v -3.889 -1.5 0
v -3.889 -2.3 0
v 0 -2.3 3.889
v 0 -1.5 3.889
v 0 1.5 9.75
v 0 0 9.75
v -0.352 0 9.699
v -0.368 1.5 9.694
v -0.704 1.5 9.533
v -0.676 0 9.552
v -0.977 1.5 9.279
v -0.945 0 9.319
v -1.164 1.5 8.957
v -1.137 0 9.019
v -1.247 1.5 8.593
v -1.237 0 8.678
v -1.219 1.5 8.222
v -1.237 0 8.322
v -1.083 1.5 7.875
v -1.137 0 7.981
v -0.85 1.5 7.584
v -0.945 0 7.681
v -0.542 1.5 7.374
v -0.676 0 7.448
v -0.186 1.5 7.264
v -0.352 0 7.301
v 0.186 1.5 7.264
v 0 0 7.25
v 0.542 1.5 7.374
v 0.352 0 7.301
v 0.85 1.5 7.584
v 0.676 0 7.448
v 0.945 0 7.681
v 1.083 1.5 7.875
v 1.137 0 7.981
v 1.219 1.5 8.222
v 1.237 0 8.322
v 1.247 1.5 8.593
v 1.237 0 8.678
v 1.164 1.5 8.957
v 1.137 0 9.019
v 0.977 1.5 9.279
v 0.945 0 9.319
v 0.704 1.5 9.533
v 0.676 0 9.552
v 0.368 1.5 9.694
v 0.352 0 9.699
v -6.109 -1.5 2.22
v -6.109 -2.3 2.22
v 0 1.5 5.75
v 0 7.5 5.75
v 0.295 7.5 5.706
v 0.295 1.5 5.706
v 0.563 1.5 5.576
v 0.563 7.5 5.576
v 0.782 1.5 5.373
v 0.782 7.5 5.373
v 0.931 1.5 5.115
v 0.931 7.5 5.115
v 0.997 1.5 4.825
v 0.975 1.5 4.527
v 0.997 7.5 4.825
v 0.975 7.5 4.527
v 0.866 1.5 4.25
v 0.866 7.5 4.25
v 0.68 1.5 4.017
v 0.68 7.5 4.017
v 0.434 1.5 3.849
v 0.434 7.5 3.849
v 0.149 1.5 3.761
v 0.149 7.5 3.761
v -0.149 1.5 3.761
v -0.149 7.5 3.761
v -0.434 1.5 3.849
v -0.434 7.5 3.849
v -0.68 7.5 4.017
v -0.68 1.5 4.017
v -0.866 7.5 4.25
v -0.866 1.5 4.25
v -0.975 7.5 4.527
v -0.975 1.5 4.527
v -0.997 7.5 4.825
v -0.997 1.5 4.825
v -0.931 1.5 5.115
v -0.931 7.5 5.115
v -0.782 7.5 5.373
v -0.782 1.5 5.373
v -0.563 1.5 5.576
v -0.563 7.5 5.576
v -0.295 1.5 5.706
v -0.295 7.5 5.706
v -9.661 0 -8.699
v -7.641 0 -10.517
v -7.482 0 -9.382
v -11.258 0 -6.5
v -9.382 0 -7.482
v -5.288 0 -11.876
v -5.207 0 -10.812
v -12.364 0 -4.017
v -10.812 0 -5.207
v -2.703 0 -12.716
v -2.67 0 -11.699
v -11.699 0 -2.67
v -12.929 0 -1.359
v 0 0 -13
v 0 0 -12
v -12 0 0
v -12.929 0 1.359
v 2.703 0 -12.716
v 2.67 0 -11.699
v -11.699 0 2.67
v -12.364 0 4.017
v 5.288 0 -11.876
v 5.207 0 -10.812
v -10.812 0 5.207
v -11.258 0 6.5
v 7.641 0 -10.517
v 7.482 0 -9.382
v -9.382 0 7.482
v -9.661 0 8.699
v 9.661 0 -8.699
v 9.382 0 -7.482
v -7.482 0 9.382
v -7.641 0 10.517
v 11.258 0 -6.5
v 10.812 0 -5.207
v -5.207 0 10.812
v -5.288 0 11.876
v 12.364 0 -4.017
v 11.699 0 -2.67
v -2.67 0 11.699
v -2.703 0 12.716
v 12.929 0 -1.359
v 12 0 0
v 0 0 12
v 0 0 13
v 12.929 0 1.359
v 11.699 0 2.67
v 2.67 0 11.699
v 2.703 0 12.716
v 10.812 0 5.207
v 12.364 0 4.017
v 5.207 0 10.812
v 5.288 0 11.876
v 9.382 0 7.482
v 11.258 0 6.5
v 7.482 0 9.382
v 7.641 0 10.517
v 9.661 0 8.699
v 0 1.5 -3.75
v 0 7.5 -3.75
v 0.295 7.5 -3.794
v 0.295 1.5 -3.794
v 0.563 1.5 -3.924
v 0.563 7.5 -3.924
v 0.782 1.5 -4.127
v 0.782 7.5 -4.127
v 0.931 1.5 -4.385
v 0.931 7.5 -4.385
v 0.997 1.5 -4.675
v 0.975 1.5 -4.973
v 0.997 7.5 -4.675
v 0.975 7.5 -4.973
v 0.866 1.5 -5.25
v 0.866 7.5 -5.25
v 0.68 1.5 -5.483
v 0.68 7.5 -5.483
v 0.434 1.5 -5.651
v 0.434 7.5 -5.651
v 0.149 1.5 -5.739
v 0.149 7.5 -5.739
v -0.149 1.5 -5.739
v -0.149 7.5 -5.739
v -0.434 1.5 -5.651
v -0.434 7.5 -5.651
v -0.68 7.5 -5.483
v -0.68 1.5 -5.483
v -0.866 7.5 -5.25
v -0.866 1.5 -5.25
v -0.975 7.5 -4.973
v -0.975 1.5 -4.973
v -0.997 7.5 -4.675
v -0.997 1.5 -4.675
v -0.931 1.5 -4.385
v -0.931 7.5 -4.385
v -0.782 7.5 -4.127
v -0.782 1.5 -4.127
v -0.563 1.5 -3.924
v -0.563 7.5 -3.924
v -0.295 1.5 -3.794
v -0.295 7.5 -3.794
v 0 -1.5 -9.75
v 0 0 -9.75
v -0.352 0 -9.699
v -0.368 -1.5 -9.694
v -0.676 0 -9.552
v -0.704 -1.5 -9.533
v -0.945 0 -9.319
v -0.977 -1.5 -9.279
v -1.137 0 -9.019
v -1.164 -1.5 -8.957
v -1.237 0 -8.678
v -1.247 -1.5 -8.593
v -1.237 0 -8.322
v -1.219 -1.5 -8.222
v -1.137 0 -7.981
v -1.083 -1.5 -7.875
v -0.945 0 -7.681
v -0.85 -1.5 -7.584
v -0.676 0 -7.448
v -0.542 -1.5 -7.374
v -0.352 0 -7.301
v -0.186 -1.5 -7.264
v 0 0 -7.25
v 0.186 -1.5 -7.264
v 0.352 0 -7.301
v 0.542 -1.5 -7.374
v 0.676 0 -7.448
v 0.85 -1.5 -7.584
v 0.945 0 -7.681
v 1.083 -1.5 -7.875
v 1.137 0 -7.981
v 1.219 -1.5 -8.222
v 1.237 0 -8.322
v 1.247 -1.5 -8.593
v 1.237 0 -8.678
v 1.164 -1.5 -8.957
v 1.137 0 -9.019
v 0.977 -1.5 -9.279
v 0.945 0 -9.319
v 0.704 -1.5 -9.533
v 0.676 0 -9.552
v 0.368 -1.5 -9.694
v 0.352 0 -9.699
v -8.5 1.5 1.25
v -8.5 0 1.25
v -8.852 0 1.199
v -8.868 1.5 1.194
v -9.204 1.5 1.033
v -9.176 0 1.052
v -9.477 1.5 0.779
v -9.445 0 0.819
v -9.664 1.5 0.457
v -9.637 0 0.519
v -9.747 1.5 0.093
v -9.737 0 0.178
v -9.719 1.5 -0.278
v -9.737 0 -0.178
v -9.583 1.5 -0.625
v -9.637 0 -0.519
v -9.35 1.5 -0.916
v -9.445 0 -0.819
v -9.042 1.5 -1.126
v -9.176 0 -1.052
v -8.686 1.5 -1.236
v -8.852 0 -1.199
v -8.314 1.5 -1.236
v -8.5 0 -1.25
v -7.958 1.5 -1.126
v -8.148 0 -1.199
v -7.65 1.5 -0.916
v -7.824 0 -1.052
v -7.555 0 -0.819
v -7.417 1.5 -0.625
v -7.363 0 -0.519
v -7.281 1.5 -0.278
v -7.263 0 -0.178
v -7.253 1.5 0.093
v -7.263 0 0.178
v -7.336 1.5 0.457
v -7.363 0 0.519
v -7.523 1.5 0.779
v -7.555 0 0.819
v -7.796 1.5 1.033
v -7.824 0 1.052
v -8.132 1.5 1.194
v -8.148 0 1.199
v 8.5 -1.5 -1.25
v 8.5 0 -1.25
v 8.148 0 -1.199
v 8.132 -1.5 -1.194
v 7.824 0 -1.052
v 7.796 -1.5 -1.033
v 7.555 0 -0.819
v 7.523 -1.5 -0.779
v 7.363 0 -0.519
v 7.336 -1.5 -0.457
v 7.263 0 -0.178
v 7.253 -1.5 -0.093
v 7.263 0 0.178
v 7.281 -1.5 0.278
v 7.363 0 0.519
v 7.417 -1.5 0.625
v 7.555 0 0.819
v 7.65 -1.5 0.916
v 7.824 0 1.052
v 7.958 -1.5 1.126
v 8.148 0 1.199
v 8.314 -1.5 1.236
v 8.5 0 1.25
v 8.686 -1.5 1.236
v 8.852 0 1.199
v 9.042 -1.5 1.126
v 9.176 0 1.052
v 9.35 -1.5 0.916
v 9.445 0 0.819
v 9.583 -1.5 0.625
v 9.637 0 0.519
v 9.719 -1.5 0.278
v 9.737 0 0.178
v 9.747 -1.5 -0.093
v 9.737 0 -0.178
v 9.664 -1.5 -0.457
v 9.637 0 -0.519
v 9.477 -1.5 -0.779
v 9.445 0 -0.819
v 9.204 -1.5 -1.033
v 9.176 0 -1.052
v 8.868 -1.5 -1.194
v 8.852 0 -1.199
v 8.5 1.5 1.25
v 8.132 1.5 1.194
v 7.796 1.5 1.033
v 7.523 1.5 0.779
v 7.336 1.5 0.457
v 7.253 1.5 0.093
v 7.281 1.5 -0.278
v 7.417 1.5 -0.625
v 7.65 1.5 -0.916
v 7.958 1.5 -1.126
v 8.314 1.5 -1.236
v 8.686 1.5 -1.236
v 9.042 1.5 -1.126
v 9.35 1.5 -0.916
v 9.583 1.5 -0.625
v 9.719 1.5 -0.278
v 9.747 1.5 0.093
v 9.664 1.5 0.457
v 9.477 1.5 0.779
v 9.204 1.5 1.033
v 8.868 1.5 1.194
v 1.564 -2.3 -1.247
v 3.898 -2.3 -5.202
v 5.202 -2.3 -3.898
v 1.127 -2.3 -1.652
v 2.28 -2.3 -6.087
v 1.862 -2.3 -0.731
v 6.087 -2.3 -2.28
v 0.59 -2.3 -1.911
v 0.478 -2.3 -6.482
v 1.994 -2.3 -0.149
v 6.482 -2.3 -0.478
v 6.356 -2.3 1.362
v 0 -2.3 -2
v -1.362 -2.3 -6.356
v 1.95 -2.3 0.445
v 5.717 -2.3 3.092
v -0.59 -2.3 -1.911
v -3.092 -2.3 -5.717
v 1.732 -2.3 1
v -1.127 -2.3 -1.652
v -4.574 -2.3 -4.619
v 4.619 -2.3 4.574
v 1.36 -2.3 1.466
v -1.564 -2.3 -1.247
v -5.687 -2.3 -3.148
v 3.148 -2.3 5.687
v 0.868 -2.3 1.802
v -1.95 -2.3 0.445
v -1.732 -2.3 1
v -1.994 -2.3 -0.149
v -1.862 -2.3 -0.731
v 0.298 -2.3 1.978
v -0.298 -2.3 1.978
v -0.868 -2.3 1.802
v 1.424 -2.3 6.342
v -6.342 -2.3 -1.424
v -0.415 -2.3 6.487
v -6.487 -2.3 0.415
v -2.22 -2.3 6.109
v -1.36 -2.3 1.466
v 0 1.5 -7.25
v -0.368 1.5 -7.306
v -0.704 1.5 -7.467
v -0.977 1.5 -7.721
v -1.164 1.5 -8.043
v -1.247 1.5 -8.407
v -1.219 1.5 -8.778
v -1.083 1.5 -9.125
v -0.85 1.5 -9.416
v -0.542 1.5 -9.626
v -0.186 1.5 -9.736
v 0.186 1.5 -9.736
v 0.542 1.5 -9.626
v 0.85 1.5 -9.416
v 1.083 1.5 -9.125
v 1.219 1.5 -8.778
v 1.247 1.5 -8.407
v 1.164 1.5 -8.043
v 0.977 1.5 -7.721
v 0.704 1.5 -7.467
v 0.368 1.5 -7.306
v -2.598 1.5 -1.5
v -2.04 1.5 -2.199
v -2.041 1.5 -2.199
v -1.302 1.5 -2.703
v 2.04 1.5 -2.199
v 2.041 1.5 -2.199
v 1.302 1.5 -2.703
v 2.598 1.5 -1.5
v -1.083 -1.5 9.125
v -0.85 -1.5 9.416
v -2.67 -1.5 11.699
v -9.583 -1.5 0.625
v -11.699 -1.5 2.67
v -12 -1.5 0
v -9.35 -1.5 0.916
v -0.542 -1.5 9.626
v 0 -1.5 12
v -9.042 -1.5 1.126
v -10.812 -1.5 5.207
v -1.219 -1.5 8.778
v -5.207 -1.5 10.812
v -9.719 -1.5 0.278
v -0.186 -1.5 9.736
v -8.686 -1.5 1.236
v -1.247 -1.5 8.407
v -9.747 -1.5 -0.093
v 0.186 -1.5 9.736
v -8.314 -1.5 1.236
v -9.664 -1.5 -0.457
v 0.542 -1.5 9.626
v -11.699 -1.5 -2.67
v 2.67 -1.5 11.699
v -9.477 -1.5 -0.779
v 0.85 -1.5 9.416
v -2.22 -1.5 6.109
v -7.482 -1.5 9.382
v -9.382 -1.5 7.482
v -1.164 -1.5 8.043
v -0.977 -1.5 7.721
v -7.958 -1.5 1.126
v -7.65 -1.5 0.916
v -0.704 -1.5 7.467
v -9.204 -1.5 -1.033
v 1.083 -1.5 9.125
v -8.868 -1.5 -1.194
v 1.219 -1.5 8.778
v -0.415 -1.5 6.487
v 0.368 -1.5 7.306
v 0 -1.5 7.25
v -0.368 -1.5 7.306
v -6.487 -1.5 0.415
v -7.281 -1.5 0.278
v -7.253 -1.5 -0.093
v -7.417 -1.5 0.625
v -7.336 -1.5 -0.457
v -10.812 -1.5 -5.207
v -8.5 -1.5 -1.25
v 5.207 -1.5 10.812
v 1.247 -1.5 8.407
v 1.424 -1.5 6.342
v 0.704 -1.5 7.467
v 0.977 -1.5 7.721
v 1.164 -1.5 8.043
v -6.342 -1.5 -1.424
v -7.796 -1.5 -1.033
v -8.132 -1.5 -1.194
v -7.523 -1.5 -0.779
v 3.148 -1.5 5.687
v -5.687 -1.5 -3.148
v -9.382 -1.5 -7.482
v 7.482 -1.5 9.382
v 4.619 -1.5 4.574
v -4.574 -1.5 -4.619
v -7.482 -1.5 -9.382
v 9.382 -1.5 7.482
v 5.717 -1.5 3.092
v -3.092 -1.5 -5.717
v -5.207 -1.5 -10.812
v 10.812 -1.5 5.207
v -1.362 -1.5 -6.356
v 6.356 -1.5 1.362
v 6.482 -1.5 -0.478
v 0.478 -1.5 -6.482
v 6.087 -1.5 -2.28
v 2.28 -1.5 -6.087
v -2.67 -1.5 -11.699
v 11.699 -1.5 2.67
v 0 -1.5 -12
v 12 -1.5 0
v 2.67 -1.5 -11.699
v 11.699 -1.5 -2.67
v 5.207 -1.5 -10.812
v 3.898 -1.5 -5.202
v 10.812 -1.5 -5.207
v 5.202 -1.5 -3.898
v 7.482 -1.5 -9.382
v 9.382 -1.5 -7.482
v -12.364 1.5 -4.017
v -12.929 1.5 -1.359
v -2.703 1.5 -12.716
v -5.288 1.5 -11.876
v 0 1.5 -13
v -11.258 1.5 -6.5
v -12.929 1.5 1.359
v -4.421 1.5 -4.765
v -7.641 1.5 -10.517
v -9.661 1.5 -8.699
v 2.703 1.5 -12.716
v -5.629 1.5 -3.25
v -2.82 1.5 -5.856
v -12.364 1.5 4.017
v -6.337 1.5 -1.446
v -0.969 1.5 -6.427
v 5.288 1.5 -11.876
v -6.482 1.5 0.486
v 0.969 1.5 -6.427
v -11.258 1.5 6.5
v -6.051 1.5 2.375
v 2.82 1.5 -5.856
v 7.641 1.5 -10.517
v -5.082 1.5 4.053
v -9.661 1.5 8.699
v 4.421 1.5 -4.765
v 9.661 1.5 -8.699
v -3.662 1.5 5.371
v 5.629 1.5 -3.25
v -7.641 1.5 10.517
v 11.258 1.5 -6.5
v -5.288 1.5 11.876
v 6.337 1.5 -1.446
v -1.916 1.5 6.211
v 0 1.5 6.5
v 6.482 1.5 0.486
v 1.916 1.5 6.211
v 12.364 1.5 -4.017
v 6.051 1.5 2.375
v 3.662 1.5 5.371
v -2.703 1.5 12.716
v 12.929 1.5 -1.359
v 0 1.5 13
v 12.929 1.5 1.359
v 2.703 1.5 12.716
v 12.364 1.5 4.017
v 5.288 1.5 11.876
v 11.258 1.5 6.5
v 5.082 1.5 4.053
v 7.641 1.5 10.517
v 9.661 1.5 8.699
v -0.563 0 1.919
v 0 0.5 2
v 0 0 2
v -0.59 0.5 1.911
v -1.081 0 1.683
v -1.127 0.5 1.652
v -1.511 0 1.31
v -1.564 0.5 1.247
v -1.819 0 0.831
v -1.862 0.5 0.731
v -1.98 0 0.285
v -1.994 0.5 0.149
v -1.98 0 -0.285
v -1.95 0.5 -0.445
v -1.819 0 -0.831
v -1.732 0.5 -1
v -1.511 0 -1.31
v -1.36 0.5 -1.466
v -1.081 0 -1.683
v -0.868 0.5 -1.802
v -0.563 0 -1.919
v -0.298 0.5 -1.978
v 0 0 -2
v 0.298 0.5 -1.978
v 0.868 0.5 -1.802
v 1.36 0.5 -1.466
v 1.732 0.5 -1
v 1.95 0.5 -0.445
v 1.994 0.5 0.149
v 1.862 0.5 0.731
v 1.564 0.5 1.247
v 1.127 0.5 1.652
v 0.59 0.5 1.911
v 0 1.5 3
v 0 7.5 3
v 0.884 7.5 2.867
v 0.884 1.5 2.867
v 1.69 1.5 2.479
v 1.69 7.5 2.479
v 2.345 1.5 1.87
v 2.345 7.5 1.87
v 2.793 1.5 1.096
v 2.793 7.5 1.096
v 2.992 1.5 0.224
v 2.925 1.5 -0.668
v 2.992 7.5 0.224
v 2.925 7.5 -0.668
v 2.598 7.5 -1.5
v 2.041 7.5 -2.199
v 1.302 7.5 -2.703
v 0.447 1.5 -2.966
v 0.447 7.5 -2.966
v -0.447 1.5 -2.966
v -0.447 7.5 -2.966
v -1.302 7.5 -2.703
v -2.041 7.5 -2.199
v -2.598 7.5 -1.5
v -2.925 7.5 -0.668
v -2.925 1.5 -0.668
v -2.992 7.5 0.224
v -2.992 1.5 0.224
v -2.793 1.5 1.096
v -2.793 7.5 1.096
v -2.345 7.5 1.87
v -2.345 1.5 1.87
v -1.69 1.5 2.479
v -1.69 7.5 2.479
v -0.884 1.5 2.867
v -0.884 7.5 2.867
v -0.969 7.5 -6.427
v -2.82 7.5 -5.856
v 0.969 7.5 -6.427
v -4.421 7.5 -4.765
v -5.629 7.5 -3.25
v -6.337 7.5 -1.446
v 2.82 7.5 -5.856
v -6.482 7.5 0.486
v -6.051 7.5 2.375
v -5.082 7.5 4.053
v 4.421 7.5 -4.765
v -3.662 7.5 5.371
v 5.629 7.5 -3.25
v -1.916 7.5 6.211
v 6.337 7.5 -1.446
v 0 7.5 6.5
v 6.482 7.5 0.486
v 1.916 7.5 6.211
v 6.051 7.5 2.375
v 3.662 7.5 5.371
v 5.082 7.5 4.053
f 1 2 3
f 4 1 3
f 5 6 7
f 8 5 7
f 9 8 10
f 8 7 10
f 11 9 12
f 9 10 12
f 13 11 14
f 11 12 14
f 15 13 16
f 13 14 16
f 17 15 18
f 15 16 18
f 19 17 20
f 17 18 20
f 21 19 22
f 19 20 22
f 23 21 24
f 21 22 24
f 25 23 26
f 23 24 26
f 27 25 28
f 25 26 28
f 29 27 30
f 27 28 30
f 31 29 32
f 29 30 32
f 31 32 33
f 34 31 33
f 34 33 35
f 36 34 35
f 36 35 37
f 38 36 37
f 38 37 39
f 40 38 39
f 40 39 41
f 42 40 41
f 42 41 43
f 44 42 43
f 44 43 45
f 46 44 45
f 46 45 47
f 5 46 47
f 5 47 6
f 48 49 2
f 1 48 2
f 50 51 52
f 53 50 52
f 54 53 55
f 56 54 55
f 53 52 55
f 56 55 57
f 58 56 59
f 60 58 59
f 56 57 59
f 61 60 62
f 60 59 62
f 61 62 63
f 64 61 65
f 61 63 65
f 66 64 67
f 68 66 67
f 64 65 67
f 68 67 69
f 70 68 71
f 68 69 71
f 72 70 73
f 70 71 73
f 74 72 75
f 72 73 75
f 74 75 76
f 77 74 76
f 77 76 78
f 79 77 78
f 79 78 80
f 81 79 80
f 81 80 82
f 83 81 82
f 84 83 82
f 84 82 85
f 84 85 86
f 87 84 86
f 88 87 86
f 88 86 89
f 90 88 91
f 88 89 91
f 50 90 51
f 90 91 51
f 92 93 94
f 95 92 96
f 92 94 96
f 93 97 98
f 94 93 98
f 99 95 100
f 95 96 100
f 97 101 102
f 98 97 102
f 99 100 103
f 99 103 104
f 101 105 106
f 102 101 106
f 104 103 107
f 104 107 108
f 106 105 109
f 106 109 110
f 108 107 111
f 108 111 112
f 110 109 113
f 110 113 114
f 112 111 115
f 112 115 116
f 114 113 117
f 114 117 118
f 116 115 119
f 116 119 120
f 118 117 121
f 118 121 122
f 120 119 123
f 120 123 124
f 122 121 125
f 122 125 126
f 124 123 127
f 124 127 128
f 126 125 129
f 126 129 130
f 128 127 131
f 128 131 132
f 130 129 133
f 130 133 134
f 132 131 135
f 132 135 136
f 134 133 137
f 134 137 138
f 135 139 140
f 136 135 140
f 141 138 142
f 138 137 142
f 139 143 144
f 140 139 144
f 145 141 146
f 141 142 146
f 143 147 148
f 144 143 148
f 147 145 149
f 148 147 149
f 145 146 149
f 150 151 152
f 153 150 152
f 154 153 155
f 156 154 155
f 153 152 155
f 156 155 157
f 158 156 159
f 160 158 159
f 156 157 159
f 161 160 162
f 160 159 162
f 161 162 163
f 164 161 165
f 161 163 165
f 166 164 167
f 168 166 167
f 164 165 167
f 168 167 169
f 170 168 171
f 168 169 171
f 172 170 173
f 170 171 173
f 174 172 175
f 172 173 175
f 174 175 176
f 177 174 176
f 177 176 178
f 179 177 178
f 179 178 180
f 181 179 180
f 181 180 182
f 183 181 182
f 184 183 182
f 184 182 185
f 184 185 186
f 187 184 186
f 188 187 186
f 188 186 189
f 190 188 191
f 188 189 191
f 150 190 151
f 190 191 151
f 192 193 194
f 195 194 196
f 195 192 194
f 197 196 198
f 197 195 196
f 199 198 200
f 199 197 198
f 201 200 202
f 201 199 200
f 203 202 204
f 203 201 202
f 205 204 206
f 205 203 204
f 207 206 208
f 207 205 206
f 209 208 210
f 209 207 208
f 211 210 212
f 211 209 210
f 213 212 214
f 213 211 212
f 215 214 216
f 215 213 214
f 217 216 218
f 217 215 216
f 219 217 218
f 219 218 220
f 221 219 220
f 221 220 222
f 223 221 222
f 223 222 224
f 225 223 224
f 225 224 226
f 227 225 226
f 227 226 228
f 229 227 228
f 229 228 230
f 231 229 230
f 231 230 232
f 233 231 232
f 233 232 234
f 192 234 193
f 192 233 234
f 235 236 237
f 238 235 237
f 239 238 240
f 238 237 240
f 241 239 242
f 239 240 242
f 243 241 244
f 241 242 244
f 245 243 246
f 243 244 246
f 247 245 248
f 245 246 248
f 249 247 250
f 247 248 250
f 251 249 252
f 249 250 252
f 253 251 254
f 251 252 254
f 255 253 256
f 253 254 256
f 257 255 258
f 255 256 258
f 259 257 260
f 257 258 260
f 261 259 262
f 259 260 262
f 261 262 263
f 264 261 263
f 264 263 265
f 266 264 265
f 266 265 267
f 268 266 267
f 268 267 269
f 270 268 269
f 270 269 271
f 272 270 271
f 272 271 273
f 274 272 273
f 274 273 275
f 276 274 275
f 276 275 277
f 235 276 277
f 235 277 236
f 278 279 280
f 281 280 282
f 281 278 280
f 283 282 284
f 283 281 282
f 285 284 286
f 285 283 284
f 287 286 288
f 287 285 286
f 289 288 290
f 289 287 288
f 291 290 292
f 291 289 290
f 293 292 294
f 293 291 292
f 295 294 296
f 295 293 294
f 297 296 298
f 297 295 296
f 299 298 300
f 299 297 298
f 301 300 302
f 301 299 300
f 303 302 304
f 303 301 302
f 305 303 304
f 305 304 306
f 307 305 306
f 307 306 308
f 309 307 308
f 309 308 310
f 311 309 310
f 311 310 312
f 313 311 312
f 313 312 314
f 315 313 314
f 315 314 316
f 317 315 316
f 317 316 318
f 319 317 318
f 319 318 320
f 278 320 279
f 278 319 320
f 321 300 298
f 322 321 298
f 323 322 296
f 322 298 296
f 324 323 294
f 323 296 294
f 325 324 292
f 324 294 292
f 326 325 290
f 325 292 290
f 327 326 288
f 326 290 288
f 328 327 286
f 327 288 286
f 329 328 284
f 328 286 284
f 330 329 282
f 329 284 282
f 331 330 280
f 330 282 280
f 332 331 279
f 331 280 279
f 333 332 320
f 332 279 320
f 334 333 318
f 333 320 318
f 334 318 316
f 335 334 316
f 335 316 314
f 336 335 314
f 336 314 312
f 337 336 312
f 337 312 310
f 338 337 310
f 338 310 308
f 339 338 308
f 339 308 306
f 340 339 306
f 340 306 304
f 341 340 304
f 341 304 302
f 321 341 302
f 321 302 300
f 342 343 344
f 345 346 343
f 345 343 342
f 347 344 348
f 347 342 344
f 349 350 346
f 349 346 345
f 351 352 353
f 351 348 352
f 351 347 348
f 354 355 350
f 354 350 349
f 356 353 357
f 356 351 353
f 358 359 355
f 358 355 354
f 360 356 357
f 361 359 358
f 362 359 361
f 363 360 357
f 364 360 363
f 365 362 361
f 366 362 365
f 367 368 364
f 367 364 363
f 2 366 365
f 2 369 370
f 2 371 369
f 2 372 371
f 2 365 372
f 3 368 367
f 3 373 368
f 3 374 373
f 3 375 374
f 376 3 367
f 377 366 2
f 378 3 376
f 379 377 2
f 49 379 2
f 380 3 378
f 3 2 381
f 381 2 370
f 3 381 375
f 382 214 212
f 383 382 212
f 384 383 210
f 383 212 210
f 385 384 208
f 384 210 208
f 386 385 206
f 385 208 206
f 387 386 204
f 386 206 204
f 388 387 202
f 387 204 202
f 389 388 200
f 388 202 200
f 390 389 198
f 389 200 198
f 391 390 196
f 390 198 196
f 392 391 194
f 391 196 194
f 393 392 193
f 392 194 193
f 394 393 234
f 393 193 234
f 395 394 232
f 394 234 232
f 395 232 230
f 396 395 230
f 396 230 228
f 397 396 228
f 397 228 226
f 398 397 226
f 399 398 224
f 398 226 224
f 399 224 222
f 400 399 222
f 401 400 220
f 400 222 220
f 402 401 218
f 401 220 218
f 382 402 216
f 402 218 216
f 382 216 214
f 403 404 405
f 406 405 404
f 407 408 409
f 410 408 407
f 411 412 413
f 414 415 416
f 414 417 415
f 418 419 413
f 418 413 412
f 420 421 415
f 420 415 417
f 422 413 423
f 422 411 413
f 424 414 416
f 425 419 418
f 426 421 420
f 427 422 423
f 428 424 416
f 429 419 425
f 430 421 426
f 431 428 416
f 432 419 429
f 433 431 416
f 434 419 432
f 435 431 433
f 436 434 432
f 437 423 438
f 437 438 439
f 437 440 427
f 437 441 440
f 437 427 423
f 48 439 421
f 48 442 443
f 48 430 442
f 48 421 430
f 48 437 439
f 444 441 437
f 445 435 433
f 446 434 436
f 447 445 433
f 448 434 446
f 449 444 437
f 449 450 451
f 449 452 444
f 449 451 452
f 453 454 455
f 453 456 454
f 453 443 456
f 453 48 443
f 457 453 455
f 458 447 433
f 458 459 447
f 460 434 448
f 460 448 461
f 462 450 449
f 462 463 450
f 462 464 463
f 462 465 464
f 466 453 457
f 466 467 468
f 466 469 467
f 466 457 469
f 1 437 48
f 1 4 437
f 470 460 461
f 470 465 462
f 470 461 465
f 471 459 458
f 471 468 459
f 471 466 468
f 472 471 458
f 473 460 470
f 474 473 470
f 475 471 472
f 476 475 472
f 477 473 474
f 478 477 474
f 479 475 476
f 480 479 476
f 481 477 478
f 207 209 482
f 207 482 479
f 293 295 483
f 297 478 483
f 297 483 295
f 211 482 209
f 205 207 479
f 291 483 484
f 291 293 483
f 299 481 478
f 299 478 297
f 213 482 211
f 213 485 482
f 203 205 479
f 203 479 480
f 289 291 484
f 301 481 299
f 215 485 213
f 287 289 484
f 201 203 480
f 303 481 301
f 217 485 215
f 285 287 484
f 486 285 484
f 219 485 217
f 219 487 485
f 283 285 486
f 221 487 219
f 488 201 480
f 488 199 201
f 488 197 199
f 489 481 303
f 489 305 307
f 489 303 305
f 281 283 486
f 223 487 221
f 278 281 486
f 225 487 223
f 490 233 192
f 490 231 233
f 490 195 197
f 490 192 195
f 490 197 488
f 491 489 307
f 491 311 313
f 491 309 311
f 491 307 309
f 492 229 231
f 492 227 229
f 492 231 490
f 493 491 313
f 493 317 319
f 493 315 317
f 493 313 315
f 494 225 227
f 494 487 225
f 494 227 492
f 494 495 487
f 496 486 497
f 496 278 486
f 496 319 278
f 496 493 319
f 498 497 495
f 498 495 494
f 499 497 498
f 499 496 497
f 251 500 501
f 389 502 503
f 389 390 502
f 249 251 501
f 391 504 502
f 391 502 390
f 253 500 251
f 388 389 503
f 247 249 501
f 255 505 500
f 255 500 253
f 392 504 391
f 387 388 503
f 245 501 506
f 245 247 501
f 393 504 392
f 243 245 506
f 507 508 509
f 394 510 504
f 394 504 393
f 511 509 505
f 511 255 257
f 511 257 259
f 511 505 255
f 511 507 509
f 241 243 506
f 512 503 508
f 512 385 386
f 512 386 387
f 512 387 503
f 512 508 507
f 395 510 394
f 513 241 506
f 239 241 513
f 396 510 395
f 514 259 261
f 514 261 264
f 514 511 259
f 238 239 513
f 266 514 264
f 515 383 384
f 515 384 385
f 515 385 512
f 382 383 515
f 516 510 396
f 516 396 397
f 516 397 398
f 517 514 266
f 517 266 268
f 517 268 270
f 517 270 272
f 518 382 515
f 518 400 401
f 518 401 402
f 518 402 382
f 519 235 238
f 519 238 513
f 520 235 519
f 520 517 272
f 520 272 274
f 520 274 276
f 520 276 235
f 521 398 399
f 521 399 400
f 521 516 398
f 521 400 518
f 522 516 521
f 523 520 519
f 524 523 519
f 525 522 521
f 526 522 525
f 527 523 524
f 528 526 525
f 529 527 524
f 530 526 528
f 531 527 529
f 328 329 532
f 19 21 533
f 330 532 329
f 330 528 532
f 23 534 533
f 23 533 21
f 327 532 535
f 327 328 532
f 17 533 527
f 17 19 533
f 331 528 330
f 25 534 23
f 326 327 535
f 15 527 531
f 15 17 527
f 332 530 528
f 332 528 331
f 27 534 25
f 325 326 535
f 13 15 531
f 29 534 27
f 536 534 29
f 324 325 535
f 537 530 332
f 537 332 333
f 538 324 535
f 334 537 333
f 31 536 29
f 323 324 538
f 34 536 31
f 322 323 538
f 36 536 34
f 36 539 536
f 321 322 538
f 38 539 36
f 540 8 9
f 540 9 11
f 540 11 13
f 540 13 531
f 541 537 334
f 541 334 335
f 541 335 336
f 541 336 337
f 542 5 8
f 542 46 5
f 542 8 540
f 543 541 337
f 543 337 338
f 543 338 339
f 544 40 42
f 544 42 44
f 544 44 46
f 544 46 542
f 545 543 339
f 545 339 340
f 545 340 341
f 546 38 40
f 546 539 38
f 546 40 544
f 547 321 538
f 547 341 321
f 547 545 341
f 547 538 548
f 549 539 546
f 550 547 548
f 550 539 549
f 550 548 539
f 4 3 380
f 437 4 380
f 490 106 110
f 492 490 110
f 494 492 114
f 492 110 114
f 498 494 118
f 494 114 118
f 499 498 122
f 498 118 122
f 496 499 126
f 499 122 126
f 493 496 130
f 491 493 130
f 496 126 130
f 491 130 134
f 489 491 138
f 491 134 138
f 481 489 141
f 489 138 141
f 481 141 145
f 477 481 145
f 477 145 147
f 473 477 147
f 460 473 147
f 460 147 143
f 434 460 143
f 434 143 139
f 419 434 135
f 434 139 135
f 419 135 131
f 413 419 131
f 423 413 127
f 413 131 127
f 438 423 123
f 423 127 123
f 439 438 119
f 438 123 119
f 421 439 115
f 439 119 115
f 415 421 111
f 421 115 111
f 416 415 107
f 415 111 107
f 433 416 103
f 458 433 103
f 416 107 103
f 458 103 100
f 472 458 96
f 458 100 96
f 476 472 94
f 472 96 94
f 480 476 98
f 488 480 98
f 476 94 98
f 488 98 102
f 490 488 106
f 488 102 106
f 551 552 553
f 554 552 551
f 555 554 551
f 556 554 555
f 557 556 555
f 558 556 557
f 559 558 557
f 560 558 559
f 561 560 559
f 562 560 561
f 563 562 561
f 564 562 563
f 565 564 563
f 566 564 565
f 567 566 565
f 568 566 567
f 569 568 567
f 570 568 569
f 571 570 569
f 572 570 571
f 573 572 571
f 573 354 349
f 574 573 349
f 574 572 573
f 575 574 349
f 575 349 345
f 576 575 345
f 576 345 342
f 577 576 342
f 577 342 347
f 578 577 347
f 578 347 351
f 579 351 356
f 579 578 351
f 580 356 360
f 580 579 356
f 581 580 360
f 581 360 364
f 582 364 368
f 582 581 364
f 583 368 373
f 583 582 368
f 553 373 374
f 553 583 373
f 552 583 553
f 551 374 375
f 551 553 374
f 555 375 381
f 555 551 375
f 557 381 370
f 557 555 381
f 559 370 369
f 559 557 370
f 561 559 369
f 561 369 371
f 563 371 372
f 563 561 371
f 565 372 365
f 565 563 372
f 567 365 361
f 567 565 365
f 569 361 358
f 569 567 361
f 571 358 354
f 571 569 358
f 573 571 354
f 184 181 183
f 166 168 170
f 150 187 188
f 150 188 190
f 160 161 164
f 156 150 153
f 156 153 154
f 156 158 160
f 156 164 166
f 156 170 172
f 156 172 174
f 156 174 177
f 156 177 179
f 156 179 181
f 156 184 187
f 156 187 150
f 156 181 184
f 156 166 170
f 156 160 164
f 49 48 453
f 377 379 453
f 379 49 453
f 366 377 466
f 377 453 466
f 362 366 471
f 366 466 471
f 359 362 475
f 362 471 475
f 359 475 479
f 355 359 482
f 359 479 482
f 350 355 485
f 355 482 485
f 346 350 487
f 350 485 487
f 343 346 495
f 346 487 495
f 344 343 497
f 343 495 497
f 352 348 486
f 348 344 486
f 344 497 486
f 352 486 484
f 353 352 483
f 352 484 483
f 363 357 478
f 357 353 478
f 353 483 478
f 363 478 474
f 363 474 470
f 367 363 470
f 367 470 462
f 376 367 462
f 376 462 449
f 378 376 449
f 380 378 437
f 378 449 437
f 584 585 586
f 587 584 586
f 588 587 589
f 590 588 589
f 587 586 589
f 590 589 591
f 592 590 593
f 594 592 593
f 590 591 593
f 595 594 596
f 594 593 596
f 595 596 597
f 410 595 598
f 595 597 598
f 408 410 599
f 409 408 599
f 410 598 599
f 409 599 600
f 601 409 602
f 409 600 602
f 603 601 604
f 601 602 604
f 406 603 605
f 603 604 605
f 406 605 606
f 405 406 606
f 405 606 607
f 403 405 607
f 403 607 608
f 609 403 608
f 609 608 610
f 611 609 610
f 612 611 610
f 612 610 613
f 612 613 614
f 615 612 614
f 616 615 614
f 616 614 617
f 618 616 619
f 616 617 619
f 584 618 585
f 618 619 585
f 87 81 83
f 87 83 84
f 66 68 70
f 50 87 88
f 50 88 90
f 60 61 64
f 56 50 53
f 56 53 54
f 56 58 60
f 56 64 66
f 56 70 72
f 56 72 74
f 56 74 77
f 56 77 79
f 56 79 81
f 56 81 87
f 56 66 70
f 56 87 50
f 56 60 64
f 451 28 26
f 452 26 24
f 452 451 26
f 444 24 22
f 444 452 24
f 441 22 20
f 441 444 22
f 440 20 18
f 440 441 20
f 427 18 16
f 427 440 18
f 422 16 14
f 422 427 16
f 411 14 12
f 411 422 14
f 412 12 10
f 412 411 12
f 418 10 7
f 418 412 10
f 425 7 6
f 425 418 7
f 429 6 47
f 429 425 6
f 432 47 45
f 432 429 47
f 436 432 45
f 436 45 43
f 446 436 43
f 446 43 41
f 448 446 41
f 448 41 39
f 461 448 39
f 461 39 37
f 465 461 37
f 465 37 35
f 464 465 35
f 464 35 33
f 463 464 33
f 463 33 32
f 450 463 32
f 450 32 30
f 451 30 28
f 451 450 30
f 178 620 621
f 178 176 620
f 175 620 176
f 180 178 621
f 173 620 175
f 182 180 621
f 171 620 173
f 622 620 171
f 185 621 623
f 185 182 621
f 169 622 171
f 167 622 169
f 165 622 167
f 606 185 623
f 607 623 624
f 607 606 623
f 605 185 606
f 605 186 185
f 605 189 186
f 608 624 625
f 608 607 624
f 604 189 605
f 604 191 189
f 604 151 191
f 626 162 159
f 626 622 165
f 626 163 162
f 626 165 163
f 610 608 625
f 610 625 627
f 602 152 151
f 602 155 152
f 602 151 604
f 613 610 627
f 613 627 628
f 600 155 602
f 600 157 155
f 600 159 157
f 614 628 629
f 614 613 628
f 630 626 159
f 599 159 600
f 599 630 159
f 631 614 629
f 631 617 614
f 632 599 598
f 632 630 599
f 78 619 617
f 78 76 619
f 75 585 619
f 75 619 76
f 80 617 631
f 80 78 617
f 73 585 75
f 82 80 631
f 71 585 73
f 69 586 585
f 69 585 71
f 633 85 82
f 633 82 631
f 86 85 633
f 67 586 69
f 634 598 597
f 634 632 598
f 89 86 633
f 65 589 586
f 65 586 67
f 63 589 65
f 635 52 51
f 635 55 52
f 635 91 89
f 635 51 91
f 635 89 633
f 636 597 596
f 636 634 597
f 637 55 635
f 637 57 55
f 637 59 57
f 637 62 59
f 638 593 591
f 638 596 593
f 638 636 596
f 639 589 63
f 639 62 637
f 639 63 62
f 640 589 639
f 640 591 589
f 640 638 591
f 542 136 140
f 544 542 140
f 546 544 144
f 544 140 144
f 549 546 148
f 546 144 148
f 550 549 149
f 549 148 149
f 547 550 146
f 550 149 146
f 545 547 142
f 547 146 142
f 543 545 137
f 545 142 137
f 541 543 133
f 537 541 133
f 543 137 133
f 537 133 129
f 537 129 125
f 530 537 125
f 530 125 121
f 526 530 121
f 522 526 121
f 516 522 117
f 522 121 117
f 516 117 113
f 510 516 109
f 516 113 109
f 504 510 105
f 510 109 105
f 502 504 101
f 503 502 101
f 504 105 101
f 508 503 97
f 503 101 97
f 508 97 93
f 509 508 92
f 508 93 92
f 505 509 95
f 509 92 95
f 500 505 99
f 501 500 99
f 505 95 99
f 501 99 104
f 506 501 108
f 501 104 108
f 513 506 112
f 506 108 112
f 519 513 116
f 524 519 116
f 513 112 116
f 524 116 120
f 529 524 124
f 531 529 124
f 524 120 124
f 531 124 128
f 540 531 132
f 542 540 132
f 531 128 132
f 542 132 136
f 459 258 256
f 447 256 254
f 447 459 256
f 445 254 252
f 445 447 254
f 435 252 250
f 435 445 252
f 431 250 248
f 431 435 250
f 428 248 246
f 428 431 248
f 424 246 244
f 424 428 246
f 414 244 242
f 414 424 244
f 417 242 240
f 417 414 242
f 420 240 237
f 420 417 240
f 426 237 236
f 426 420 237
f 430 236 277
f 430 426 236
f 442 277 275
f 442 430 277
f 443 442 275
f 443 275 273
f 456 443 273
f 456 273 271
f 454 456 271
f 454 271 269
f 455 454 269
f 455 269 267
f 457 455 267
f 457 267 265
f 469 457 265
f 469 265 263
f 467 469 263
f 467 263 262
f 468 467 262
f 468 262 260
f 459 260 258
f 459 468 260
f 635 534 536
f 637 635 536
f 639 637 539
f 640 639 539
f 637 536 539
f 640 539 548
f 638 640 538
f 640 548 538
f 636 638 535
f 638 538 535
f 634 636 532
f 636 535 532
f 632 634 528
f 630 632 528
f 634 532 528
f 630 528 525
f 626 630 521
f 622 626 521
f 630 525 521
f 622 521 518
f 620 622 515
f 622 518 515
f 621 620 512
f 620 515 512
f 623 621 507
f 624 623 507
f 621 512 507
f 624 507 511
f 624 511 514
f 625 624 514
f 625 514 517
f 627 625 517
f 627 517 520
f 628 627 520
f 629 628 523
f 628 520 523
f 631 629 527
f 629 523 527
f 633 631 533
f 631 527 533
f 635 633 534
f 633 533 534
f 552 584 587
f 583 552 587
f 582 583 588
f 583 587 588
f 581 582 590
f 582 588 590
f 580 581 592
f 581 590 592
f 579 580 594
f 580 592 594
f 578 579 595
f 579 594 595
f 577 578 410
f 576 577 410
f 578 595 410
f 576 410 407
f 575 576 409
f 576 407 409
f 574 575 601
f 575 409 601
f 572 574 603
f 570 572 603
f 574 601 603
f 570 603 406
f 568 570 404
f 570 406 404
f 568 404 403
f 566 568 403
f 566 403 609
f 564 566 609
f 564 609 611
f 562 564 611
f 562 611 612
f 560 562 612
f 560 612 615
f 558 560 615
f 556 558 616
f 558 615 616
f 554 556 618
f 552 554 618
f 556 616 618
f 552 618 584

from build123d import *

# Parameters (mm, degrees)
SKETCH1_R           = 13
BOSS_EXTRUDE1_DEPTH = 1.5
SKETCH2_R           = 6.5
BOSS_EXTRUDE2_DEPTH = 6
SKETCH3_R           = 3
CUT_EXTRUDE1_DEPTH  = 6
SKETCH4_R           = 1.25
CUT_EXTRUDE5_DEPTH  = 8
SKETCH6_R           = 1
CUT_EXTRUDE6_DEPTH  = 6
SKETCH7_R           = 12
SKETCH7_R_2         = 2
BOSS_EXTRUDE3_DEPTH = 1.5
SKETCH8_R           = 6.5
SKETCH8_R_2         = 2
BOSS_EXTRUDE4_DEPTH = 0.8
CUT_EXTRUDE8_START  = -10.8
SKETCH9_R           = 1.25
CUT_EXTRUDE8_DEPTH  = 10.8
CUT_EXTRUDE9_START  = -10.8
SKETCH10_R          = 2
CUT_EXTRUDE9_DEPTH  = 10.8
CUT_EXTRUDE10_DEPTH = 0.8
CHAMFER4_SIZE       = 1


with BuildPart() as part:
    # Sketch1 → Boss-Extrude1 (new body)
    with BuildSketch(Plane(origin=(0, 0, 0), x_dir=(1, 0, 0), z_dir=(0, 1, 0))):
        with Locations(Location((0, 0, 0), (0, 0, 270))):
            Circle(SKETCH1_R)
    extrude(amount=BOSS_EXTRUDE1_DEPTH)

    # Sketch2 → Boss-Extrude2 (add)
    with BuildSketch(Plane(origin=(0, 1.5, 0), x_dir=(1, 0, 0), z_dir=(0, 1, 0))):
        with Locations(Location((0, 0, 0), (0, 0, 270))):
            Circle(SKETCH2_R)
    extrude(amount=BOSS_EXTRUDE2_DEPTH)

    # Sketch3 → Cut-Extrude1 (cut)
    with BuildSketch(Plane(origin=(0, 7.5, 0), x_dir=(1, 0, 0), z_dir=(0, 1, 0))):
        with Locations(Location((0, 0, 0), (0, 0, 270))):
            Circle(SKETCH3_R)
    extrude(amount=-CUT_EXTRUDE1_DEPTH, mode=Mode.SUBTRACT)

    # Sketch4 → Cut-Extrude5 (cut, symmetric)
    with BuildSketch(Plane.XZ):
        with Locations(Location((-8.5, 0, 0), (0, 0, 90))):
            Circle(SKETCH4_R)
        with Locations(Location((0, 8.5, 0), (0, 0, 90))):
            Circle(SKETCH4_R)
        with Locations(Location((8.5, 0, 0), (0, 0, 90))):
            Circle(SKETCH4_R)
        with Locations(Location((0, -8.5, 0), (0, 0, 90))):
            Circle(SKETCH4_R)
    extrude(amount=CUT_EXTRUDE5_DEPTH, both=True, mode=Mode.SUBTRACT)

    # Sketch6 → Cut-Extrude6 (cut)
    with BuildSketch(Plane(origin=(0, 7.5, 0), x_dir=(1, 0, 0), z_dir=(0, 1, 0))):
        with Locations(Location((0, 4.75, 0), (0, 0, 270))):
            Circle(SKETCH6_R)
        with Locations(Location((0, -4.75, 0), (0, 0, 270))):
            Circle(SKETCH6_R)
    extrude(amount=-CUT_EXTRUDE6_DEPTH, mode=Mode.SUBTRACT)

    # Sketch7 → Boss-Extrude3 (add)
    with BuildSketch(Plane.XZ):
        with Locations(Location((0, 0, 0), (0, 0, 270))):
            Circle(SKETCH7_R)
        with Locations(Location((0, 0, 0), (0, 0, 270))):
            Circle(SKETCH7_R_2, mode=Mode.SUBTRACT)
    extrude(amount=BOSS_EXTRUDE3_DEPTH)

    # Sketch8 → Boss-Extrude4 (add)
    with BuildSketch(Plane.XZ.offset(1.5)):
        with Locations(Location((0, 0, 0), (0, 0, 90))):
            Circle(SKETCH8_R)
        with Locations(Location((0, 0, 0), (0, 0, 270))):
            Circle(SKETCH8_R_2, mode=Mode.SUBTRACT)
    extrude(amount=BOSS_EXTRUDE4_DEPTH)

    # Sketch9 → Cut-Extrude8 (cut)
    with BuildSketch(Plane(origin=(0, 0, 0), x_dir=(1, 0, 0), z_dir=(0, 1, 0)).offset(CUT_EXTRUDE8_START)):
        with Locations(Location((8.5, 0, 0), (0, 0, 90))):
            Circle(SKETCH9_R)
        with Locations(Location((0, -8.5, 0), (0, 0, 90))):
            Circle(SKETCH9_R)
        with Locations(Location((-8.5, 0, 0), (0, 0, 90))):
            Circle(SKETCH9_R)
        with Locations(Location((0, 8.5, 0), (0, 0, 90))):
            Circle(SKETCH9_R)
    extrude(amount=CUT_EXTRUDE8_DEPTH, mode=Mode.SUBTRACT)

    # Sketch10 → Cut-Extrude9 (cut)
    with BuildSketch(Plane.XZ.offset(CUT_EXTRUDE9_START)):
        with Locations(Location((0, 0, 0), (0, 0, 90))):
            Circle(SKETCH10_R)
    extrude(amount=CUT_EXTRUDE9_DEPTH, mode=Mode.SUBTRACT)

    # Sketch11 → Cut-Extrude10 (cut)
    with BuildSketch(Plane.XZ.offset(2.3)):
        with BuildLine():
            Line((-6.109126461, 2.220039164), (-3.889087297, 0))
            Line((-3.889087297, 0), (0, 3.889087297))
            Line((0, 3.889087297), (-2.220039164, 6.109126461))
            ThreePointArc((-2.220039164, 6.109126461), (-4.596194078, 4.596194078), (-6.109126461, 2.220039164))
        make_face()
    extrude(amount=-CUT_EXTRUDE10_DEPTH, mode=Mode.SUBTRACT)

    # Chamfer4
    chamfer4_edges = [part.edges().sort_by_distance(p)[0] for p in [
        (0, 1.5, -2),
    ]]
    chamfer(chamfer4_edges, length=CHAMFER4_SIZE - 0.0001)  # a hair under: the kernel refuses the full size


solid = part.part
